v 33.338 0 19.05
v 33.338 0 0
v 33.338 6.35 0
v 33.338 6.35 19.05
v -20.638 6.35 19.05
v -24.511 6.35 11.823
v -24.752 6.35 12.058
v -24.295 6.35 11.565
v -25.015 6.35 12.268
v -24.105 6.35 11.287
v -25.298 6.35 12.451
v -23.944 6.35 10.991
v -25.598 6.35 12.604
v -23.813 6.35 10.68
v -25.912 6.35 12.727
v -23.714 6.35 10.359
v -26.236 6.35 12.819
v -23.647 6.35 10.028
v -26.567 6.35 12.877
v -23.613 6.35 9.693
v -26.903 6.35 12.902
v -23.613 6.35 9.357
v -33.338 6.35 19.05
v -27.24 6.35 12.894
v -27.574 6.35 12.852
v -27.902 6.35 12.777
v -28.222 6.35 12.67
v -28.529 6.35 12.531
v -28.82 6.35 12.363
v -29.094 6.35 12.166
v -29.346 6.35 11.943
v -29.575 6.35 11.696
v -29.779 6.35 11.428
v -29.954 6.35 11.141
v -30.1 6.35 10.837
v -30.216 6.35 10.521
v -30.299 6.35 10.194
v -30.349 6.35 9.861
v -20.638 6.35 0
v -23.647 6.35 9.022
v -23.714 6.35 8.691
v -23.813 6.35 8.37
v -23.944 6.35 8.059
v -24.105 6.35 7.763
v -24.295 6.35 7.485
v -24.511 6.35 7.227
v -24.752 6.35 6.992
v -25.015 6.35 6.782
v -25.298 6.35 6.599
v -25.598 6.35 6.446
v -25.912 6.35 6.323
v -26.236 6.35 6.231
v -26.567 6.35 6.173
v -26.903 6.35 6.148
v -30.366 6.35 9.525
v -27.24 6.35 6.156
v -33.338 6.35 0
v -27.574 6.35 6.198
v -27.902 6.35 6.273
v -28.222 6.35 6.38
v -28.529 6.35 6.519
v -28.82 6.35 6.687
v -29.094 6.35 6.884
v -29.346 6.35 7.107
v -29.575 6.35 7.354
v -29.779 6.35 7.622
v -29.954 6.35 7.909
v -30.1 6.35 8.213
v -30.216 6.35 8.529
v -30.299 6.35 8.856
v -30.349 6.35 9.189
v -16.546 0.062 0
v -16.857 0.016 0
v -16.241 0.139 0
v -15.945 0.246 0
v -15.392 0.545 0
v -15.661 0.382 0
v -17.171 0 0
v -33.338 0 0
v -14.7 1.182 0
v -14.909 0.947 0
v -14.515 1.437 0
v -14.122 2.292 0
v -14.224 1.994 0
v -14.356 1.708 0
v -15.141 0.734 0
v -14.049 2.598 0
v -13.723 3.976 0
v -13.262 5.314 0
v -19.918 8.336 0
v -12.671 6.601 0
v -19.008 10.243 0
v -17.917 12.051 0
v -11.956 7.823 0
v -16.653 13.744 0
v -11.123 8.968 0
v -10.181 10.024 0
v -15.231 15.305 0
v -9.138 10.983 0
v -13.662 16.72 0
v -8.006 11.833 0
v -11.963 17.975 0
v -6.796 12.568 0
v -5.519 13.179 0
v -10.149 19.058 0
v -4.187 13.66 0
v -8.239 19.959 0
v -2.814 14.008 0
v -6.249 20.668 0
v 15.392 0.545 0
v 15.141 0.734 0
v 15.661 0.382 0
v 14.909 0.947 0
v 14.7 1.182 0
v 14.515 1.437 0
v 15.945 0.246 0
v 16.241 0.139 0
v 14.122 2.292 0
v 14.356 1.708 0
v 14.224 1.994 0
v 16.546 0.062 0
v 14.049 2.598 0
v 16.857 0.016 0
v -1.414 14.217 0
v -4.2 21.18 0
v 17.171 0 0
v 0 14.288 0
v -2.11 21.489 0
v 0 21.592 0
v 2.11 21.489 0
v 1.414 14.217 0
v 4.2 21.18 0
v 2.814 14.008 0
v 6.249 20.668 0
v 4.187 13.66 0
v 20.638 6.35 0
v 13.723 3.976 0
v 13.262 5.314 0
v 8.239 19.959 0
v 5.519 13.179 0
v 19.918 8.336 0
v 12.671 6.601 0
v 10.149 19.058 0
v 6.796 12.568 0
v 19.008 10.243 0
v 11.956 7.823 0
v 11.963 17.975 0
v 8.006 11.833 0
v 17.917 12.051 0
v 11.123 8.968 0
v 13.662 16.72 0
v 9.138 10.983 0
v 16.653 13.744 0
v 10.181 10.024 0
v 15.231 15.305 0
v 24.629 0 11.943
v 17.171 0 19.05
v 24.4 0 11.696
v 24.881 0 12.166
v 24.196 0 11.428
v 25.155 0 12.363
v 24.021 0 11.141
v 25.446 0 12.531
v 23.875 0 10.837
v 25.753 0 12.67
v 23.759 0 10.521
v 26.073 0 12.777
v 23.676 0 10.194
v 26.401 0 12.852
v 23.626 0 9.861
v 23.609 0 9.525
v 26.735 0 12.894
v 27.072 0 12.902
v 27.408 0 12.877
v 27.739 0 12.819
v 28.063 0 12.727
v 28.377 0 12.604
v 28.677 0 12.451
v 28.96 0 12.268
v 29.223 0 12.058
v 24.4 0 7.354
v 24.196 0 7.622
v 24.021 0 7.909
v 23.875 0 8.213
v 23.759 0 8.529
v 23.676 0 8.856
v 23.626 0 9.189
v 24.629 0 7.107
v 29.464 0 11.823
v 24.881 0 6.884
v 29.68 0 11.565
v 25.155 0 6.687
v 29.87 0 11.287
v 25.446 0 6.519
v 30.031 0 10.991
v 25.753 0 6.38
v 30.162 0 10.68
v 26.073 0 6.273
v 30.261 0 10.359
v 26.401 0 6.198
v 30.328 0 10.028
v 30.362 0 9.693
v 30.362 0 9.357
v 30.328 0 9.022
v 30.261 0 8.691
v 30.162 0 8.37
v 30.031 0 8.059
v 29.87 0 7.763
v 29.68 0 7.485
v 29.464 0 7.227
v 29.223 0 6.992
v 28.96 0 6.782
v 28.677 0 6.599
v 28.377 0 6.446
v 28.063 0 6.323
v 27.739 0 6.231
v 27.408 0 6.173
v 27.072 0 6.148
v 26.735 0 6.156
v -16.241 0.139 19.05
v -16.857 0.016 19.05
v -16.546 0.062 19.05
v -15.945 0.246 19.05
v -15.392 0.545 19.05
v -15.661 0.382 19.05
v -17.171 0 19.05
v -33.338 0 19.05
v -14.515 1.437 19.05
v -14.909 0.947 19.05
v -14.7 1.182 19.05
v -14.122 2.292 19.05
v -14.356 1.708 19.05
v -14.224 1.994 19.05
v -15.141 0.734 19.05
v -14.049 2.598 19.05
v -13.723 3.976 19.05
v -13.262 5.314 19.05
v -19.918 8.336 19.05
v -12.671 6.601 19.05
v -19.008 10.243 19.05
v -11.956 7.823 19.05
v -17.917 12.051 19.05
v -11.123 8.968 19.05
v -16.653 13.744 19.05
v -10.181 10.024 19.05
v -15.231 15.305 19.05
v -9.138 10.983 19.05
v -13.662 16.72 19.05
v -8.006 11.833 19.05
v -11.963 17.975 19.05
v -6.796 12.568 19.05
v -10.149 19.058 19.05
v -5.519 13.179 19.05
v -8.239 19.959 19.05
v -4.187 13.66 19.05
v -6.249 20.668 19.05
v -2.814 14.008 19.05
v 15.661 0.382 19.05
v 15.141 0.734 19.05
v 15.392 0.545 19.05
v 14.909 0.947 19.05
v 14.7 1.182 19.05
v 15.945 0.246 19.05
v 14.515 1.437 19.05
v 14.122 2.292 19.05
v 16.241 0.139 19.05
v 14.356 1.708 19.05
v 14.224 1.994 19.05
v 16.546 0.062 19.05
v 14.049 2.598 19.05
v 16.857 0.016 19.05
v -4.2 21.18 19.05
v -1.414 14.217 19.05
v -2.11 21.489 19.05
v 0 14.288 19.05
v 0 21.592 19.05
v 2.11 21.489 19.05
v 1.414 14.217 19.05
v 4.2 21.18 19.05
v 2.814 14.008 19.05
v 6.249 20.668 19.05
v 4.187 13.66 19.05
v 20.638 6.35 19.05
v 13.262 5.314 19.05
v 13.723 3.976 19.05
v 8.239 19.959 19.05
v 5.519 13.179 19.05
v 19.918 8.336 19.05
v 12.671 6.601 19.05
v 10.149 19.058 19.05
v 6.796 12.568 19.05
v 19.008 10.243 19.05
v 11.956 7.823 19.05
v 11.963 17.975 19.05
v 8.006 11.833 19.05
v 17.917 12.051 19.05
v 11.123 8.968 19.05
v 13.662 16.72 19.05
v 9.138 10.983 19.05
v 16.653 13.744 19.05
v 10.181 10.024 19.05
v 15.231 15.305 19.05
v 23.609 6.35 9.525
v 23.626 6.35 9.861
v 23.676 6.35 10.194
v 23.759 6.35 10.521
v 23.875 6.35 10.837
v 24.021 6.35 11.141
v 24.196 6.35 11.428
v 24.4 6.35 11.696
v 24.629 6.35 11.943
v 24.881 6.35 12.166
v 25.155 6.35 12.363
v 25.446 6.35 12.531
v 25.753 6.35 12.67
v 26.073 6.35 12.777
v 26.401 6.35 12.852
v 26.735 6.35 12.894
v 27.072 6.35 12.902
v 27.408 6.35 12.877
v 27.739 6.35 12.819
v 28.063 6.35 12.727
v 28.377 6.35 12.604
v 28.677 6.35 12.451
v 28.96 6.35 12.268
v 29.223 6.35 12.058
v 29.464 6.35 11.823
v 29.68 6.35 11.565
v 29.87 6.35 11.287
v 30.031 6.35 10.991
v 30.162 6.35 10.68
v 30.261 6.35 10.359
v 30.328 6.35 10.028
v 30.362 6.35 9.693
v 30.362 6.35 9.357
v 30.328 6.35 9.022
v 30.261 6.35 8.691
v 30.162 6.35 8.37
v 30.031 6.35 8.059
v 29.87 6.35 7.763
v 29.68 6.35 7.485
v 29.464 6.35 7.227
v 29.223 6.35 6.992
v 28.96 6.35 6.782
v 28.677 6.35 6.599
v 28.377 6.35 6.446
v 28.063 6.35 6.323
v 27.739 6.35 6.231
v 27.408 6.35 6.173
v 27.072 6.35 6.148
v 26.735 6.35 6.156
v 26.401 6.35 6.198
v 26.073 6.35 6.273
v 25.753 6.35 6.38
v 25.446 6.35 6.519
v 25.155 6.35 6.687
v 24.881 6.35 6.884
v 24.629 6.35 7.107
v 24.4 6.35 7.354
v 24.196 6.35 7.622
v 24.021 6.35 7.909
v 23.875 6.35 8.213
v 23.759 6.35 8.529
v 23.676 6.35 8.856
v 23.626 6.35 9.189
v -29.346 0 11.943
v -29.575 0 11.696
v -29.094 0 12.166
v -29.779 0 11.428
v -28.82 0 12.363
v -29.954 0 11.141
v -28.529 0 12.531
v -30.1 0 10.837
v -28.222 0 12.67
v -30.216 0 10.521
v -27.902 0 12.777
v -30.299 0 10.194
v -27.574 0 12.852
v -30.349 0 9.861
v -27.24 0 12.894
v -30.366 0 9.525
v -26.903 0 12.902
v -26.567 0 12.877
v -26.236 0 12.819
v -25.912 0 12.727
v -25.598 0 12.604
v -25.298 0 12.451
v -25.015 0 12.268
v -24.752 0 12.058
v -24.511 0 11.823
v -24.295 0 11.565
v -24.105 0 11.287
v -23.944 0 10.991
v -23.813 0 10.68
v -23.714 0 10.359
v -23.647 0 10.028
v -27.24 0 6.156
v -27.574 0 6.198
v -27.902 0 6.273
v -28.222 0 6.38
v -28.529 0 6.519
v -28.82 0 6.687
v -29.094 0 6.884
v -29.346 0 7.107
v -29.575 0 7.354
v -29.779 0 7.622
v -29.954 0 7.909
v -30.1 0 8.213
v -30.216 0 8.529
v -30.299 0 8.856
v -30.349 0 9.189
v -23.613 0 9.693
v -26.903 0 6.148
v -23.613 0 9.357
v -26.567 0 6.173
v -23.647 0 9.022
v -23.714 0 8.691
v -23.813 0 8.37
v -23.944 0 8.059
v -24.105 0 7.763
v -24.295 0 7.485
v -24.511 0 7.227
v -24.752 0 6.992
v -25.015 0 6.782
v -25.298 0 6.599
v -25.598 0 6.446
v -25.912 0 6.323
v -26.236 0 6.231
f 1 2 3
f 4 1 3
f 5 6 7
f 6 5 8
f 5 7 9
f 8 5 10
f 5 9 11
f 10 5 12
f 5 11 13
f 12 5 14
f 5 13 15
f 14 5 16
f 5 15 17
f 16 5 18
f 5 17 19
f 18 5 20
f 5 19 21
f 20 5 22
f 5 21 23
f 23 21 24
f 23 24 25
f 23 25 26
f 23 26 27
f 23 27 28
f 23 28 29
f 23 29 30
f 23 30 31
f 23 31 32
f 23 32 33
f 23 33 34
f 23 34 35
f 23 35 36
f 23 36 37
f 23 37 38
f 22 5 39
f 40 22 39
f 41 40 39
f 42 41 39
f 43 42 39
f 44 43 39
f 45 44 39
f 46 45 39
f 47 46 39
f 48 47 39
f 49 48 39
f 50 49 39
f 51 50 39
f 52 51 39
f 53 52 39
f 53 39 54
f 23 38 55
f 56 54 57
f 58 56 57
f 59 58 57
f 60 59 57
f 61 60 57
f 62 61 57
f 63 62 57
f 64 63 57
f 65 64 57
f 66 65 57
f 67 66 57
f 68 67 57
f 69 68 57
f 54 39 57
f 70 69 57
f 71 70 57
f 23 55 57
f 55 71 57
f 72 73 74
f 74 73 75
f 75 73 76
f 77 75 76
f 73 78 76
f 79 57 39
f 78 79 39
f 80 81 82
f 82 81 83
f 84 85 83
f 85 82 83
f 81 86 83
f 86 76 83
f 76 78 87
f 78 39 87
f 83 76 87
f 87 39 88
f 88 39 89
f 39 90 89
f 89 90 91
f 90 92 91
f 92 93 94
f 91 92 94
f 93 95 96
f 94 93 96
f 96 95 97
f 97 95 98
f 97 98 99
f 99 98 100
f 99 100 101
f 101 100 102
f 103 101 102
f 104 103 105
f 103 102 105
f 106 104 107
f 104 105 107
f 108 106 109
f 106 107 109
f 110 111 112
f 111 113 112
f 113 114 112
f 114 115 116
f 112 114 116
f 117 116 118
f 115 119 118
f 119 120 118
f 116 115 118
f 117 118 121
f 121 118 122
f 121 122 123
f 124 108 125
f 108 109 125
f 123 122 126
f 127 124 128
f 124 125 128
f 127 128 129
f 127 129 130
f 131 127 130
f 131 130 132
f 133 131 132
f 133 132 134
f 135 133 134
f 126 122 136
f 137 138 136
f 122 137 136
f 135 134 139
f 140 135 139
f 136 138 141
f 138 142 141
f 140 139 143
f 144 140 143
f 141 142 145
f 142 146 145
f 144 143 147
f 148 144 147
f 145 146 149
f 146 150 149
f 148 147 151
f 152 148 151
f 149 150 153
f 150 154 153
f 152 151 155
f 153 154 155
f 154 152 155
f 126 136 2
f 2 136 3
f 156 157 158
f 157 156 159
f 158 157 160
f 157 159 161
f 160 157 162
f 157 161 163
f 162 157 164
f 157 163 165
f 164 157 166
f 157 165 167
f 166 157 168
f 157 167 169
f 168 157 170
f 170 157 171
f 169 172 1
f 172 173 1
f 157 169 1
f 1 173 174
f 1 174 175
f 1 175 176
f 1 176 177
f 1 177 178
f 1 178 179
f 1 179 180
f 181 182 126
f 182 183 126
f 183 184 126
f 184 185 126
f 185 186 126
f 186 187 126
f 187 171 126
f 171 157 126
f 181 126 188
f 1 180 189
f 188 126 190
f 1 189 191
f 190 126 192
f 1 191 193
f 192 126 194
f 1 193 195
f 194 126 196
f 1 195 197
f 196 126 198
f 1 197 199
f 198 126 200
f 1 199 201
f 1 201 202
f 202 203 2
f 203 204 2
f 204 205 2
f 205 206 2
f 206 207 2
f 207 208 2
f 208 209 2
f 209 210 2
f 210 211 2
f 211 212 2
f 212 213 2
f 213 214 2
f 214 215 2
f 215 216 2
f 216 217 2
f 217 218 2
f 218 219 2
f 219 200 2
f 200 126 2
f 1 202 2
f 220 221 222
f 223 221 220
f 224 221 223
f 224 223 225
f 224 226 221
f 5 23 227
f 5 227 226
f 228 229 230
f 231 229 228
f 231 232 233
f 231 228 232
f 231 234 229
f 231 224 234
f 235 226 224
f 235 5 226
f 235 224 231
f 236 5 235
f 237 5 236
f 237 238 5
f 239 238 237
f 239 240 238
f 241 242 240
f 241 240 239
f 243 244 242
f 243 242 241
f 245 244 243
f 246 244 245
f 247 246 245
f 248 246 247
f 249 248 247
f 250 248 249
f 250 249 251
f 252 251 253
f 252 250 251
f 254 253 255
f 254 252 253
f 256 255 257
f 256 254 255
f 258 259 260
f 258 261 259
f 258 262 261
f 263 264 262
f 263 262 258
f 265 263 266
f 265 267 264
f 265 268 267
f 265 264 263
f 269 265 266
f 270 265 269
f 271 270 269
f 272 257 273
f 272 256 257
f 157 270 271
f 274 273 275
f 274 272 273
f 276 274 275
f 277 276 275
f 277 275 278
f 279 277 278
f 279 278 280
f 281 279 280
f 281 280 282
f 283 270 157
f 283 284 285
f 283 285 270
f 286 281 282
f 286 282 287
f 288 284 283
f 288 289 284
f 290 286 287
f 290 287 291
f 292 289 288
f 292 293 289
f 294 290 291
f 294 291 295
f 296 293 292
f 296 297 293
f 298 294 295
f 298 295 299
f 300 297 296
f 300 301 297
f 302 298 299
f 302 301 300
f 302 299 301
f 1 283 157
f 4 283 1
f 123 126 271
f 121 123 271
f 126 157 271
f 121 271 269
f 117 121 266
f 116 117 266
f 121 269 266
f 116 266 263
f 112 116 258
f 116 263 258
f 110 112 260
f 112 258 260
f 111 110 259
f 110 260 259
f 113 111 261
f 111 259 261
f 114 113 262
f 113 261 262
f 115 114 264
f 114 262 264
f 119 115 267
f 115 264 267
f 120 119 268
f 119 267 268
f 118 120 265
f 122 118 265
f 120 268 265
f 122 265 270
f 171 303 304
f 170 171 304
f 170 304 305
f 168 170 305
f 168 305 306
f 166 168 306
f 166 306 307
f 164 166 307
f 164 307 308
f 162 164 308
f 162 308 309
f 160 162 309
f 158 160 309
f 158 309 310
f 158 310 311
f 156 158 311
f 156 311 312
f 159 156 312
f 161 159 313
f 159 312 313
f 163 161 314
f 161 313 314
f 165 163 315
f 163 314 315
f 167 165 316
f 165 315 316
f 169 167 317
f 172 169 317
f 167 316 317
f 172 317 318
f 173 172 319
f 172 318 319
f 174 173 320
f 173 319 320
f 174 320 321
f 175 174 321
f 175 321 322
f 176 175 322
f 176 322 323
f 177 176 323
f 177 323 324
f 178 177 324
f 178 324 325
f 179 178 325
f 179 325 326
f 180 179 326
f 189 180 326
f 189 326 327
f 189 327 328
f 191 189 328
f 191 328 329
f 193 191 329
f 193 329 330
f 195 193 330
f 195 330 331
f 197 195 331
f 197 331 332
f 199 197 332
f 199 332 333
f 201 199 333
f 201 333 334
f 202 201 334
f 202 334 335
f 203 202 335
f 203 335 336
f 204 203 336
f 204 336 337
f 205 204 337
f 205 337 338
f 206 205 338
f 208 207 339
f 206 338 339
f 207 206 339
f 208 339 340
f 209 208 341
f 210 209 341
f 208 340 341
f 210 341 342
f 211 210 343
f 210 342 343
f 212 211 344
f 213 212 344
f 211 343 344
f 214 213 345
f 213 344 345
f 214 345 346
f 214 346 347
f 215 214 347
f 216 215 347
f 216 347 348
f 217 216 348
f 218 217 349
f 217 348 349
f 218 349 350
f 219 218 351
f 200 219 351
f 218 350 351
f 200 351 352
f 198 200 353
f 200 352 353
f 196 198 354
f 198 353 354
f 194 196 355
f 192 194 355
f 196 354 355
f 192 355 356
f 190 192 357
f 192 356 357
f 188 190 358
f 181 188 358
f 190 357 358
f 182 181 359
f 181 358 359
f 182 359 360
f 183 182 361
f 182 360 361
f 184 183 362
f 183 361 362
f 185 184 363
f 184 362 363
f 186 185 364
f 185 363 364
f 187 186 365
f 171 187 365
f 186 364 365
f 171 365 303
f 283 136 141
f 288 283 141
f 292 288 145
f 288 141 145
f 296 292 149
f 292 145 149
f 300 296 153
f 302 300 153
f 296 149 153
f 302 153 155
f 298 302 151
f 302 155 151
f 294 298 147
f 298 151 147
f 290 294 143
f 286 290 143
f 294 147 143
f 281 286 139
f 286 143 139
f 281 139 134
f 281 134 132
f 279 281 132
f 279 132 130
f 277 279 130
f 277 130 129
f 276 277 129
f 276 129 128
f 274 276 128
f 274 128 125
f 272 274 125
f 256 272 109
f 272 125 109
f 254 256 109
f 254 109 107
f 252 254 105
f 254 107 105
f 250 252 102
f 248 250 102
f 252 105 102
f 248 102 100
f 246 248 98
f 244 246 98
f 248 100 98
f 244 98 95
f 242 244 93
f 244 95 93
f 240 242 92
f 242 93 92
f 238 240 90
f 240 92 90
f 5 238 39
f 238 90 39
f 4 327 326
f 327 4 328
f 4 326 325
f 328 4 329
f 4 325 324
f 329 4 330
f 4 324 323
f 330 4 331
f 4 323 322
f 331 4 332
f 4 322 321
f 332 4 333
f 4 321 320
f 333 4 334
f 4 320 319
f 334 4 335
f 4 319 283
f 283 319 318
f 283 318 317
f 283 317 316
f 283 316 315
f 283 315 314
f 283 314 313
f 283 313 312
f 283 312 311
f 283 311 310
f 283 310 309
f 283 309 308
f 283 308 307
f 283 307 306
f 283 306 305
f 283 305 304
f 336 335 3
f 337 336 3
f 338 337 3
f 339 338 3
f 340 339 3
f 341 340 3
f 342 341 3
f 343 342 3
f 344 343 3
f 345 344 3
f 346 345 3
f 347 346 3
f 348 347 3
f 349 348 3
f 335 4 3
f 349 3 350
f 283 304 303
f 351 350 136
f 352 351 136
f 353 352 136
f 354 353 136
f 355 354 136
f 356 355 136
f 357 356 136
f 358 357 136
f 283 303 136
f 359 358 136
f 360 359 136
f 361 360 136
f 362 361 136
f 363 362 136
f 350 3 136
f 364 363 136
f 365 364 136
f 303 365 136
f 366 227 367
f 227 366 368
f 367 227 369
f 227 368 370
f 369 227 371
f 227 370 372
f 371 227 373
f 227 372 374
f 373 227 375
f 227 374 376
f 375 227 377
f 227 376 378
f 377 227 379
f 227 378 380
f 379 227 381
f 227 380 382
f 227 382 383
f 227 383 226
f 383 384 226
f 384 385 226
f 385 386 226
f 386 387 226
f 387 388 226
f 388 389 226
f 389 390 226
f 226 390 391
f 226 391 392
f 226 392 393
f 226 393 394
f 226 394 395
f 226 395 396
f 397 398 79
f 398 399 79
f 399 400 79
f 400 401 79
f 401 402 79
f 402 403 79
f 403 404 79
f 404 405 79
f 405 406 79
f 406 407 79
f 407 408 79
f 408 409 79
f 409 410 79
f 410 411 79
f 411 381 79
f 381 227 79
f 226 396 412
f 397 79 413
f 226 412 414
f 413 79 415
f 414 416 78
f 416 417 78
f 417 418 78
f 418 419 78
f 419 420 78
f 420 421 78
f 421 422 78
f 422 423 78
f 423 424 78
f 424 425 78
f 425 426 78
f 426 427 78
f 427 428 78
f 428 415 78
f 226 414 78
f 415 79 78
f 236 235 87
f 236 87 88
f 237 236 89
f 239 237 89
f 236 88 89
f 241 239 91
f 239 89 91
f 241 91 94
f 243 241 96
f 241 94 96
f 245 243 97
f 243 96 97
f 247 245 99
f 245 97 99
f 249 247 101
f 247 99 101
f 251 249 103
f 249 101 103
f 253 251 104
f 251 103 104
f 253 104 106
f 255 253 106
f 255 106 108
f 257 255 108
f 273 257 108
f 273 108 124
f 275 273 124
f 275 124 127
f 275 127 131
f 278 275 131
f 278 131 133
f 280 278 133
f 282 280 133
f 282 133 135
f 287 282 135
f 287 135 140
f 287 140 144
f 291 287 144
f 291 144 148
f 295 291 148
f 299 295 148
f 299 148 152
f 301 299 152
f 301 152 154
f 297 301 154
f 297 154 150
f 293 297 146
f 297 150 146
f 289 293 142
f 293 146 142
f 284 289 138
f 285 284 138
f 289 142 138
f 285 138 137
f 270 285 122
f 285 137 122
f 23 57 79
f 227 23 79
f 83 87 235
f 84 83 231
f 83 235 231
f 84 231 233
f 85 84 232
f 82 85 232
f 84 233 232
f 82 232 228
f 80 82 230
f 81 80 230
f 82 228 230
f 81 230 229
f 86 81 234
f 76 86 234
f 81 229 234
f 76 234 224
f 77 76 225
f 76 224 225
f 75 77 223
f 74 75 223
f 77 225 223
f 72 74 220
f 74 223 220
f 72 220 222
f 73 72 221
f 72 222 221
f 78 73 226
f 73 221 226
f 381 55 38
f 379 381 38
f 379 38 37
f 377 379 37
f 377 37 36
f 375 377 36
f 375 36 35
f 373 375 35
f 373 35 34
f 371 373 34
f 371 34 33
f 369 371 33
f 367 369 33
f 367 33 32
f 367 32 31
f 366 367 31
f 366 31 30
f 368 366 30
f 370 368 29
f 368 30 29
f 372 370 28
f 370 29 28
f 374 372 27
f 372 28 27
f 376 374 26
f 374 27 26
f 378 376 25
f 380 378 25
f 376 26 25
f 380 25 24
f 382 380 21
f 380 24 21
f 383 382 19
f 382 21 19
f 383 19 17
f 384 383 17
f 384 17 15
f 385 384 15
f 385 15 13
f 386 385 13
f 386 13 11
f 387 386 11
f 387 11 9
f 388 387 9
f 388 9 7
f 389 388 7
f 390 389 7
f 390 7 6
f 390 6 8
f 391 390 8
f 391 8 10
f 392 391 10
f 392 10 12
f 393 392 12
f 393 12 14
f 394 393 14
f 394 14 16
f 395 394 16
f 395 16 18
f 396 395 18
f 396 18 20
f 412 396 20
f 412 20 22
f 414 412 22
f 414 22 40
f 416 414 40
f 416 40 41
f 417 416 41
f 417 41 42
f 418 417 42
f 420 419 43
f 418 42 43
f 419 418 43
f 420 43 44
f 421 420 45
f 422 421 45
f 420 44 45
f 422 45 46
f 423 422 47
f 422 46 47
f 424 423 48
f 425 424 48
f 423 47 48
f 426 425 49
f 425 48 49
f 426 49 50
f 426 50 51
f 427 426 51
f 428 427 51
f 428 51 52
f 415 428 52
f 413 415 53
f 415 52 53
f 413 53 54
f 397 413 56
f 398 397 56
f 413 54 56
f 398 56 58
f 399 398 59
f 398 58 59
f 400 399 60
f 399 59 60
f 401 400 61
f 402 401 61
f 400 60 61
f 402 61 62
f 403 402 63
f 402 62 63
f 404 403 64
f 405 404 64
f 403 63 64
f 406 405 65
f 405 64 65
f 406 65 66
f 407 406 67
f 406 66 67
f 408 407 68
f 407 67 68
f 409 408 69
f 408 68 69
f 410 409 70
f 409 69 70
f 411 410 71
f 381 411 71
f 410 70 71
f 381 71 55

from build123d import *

# Parameters (mm, degrees)
BOSS_EXTRUDE1_DEPTH = 19.05
SKETCH2_R           = 3.3782
CUT_EXTRUDE1_DEPTH  = 42.311259545
FILLET1_R           = 3.175


with BuildPart() as part:
    # Sketch1 → Boss-Extrude1 (new body)
    with BuildSketch(Plane.XY):
        with BuildLine():
            Line((14.2875, 0), (33.3375, 0))
            Line((33.3375, 0), (33.3375, 6.35))
            Line((33.3375, 6.35), (20.6375, 6.35))
            ThreePointArc((20.6375, 6.35), (0, 21.592334433), (-20.6375, 6.35))
            Line((-20.6375, 6.35), (-33.3375, 6.35))
            Line((-33.3375, 6.35), (-33.3375, 0))
            Line((-33.3375, 0), (-14.2875, 0))
            ThreePointArc((-14.2875, 0), (0, 14.2875), (14.2875, 0))
        make_face()
    extrude(amount=BOSS_EXTRUDE1_DEPTH)

    # Sketch2 → Cut-Extrude1 (cut, through all)
    with BuildSketch(Plane(origin=(0, 6.35, 0), x_dir=(1, 0, 0), z_dir=(0, 1, 0))):
        with Locations(Location((26.9875, -9.525, 0), (0, 0, 180))):
            Circle(SKETCH2_R)
        with Locations(Location((-26.9875, -9.525, 0), (0, 0, 180))):
            Circle(SKETCH2_R)
    extrude(amount=-CUT_EXTRUDE1_DEPTH, mode=Mode.SUBTRACT)

    # Fillet1
    fillet1_edges = [part.edges().sort_by_distance(p)[0] for p in [
        (-14.2875, 0, 9.525),
        (14.2875, 0, 9.525),
    ]]
    fillet(fillet1_edges, radius=FILLET1_R)


solid = part.part
